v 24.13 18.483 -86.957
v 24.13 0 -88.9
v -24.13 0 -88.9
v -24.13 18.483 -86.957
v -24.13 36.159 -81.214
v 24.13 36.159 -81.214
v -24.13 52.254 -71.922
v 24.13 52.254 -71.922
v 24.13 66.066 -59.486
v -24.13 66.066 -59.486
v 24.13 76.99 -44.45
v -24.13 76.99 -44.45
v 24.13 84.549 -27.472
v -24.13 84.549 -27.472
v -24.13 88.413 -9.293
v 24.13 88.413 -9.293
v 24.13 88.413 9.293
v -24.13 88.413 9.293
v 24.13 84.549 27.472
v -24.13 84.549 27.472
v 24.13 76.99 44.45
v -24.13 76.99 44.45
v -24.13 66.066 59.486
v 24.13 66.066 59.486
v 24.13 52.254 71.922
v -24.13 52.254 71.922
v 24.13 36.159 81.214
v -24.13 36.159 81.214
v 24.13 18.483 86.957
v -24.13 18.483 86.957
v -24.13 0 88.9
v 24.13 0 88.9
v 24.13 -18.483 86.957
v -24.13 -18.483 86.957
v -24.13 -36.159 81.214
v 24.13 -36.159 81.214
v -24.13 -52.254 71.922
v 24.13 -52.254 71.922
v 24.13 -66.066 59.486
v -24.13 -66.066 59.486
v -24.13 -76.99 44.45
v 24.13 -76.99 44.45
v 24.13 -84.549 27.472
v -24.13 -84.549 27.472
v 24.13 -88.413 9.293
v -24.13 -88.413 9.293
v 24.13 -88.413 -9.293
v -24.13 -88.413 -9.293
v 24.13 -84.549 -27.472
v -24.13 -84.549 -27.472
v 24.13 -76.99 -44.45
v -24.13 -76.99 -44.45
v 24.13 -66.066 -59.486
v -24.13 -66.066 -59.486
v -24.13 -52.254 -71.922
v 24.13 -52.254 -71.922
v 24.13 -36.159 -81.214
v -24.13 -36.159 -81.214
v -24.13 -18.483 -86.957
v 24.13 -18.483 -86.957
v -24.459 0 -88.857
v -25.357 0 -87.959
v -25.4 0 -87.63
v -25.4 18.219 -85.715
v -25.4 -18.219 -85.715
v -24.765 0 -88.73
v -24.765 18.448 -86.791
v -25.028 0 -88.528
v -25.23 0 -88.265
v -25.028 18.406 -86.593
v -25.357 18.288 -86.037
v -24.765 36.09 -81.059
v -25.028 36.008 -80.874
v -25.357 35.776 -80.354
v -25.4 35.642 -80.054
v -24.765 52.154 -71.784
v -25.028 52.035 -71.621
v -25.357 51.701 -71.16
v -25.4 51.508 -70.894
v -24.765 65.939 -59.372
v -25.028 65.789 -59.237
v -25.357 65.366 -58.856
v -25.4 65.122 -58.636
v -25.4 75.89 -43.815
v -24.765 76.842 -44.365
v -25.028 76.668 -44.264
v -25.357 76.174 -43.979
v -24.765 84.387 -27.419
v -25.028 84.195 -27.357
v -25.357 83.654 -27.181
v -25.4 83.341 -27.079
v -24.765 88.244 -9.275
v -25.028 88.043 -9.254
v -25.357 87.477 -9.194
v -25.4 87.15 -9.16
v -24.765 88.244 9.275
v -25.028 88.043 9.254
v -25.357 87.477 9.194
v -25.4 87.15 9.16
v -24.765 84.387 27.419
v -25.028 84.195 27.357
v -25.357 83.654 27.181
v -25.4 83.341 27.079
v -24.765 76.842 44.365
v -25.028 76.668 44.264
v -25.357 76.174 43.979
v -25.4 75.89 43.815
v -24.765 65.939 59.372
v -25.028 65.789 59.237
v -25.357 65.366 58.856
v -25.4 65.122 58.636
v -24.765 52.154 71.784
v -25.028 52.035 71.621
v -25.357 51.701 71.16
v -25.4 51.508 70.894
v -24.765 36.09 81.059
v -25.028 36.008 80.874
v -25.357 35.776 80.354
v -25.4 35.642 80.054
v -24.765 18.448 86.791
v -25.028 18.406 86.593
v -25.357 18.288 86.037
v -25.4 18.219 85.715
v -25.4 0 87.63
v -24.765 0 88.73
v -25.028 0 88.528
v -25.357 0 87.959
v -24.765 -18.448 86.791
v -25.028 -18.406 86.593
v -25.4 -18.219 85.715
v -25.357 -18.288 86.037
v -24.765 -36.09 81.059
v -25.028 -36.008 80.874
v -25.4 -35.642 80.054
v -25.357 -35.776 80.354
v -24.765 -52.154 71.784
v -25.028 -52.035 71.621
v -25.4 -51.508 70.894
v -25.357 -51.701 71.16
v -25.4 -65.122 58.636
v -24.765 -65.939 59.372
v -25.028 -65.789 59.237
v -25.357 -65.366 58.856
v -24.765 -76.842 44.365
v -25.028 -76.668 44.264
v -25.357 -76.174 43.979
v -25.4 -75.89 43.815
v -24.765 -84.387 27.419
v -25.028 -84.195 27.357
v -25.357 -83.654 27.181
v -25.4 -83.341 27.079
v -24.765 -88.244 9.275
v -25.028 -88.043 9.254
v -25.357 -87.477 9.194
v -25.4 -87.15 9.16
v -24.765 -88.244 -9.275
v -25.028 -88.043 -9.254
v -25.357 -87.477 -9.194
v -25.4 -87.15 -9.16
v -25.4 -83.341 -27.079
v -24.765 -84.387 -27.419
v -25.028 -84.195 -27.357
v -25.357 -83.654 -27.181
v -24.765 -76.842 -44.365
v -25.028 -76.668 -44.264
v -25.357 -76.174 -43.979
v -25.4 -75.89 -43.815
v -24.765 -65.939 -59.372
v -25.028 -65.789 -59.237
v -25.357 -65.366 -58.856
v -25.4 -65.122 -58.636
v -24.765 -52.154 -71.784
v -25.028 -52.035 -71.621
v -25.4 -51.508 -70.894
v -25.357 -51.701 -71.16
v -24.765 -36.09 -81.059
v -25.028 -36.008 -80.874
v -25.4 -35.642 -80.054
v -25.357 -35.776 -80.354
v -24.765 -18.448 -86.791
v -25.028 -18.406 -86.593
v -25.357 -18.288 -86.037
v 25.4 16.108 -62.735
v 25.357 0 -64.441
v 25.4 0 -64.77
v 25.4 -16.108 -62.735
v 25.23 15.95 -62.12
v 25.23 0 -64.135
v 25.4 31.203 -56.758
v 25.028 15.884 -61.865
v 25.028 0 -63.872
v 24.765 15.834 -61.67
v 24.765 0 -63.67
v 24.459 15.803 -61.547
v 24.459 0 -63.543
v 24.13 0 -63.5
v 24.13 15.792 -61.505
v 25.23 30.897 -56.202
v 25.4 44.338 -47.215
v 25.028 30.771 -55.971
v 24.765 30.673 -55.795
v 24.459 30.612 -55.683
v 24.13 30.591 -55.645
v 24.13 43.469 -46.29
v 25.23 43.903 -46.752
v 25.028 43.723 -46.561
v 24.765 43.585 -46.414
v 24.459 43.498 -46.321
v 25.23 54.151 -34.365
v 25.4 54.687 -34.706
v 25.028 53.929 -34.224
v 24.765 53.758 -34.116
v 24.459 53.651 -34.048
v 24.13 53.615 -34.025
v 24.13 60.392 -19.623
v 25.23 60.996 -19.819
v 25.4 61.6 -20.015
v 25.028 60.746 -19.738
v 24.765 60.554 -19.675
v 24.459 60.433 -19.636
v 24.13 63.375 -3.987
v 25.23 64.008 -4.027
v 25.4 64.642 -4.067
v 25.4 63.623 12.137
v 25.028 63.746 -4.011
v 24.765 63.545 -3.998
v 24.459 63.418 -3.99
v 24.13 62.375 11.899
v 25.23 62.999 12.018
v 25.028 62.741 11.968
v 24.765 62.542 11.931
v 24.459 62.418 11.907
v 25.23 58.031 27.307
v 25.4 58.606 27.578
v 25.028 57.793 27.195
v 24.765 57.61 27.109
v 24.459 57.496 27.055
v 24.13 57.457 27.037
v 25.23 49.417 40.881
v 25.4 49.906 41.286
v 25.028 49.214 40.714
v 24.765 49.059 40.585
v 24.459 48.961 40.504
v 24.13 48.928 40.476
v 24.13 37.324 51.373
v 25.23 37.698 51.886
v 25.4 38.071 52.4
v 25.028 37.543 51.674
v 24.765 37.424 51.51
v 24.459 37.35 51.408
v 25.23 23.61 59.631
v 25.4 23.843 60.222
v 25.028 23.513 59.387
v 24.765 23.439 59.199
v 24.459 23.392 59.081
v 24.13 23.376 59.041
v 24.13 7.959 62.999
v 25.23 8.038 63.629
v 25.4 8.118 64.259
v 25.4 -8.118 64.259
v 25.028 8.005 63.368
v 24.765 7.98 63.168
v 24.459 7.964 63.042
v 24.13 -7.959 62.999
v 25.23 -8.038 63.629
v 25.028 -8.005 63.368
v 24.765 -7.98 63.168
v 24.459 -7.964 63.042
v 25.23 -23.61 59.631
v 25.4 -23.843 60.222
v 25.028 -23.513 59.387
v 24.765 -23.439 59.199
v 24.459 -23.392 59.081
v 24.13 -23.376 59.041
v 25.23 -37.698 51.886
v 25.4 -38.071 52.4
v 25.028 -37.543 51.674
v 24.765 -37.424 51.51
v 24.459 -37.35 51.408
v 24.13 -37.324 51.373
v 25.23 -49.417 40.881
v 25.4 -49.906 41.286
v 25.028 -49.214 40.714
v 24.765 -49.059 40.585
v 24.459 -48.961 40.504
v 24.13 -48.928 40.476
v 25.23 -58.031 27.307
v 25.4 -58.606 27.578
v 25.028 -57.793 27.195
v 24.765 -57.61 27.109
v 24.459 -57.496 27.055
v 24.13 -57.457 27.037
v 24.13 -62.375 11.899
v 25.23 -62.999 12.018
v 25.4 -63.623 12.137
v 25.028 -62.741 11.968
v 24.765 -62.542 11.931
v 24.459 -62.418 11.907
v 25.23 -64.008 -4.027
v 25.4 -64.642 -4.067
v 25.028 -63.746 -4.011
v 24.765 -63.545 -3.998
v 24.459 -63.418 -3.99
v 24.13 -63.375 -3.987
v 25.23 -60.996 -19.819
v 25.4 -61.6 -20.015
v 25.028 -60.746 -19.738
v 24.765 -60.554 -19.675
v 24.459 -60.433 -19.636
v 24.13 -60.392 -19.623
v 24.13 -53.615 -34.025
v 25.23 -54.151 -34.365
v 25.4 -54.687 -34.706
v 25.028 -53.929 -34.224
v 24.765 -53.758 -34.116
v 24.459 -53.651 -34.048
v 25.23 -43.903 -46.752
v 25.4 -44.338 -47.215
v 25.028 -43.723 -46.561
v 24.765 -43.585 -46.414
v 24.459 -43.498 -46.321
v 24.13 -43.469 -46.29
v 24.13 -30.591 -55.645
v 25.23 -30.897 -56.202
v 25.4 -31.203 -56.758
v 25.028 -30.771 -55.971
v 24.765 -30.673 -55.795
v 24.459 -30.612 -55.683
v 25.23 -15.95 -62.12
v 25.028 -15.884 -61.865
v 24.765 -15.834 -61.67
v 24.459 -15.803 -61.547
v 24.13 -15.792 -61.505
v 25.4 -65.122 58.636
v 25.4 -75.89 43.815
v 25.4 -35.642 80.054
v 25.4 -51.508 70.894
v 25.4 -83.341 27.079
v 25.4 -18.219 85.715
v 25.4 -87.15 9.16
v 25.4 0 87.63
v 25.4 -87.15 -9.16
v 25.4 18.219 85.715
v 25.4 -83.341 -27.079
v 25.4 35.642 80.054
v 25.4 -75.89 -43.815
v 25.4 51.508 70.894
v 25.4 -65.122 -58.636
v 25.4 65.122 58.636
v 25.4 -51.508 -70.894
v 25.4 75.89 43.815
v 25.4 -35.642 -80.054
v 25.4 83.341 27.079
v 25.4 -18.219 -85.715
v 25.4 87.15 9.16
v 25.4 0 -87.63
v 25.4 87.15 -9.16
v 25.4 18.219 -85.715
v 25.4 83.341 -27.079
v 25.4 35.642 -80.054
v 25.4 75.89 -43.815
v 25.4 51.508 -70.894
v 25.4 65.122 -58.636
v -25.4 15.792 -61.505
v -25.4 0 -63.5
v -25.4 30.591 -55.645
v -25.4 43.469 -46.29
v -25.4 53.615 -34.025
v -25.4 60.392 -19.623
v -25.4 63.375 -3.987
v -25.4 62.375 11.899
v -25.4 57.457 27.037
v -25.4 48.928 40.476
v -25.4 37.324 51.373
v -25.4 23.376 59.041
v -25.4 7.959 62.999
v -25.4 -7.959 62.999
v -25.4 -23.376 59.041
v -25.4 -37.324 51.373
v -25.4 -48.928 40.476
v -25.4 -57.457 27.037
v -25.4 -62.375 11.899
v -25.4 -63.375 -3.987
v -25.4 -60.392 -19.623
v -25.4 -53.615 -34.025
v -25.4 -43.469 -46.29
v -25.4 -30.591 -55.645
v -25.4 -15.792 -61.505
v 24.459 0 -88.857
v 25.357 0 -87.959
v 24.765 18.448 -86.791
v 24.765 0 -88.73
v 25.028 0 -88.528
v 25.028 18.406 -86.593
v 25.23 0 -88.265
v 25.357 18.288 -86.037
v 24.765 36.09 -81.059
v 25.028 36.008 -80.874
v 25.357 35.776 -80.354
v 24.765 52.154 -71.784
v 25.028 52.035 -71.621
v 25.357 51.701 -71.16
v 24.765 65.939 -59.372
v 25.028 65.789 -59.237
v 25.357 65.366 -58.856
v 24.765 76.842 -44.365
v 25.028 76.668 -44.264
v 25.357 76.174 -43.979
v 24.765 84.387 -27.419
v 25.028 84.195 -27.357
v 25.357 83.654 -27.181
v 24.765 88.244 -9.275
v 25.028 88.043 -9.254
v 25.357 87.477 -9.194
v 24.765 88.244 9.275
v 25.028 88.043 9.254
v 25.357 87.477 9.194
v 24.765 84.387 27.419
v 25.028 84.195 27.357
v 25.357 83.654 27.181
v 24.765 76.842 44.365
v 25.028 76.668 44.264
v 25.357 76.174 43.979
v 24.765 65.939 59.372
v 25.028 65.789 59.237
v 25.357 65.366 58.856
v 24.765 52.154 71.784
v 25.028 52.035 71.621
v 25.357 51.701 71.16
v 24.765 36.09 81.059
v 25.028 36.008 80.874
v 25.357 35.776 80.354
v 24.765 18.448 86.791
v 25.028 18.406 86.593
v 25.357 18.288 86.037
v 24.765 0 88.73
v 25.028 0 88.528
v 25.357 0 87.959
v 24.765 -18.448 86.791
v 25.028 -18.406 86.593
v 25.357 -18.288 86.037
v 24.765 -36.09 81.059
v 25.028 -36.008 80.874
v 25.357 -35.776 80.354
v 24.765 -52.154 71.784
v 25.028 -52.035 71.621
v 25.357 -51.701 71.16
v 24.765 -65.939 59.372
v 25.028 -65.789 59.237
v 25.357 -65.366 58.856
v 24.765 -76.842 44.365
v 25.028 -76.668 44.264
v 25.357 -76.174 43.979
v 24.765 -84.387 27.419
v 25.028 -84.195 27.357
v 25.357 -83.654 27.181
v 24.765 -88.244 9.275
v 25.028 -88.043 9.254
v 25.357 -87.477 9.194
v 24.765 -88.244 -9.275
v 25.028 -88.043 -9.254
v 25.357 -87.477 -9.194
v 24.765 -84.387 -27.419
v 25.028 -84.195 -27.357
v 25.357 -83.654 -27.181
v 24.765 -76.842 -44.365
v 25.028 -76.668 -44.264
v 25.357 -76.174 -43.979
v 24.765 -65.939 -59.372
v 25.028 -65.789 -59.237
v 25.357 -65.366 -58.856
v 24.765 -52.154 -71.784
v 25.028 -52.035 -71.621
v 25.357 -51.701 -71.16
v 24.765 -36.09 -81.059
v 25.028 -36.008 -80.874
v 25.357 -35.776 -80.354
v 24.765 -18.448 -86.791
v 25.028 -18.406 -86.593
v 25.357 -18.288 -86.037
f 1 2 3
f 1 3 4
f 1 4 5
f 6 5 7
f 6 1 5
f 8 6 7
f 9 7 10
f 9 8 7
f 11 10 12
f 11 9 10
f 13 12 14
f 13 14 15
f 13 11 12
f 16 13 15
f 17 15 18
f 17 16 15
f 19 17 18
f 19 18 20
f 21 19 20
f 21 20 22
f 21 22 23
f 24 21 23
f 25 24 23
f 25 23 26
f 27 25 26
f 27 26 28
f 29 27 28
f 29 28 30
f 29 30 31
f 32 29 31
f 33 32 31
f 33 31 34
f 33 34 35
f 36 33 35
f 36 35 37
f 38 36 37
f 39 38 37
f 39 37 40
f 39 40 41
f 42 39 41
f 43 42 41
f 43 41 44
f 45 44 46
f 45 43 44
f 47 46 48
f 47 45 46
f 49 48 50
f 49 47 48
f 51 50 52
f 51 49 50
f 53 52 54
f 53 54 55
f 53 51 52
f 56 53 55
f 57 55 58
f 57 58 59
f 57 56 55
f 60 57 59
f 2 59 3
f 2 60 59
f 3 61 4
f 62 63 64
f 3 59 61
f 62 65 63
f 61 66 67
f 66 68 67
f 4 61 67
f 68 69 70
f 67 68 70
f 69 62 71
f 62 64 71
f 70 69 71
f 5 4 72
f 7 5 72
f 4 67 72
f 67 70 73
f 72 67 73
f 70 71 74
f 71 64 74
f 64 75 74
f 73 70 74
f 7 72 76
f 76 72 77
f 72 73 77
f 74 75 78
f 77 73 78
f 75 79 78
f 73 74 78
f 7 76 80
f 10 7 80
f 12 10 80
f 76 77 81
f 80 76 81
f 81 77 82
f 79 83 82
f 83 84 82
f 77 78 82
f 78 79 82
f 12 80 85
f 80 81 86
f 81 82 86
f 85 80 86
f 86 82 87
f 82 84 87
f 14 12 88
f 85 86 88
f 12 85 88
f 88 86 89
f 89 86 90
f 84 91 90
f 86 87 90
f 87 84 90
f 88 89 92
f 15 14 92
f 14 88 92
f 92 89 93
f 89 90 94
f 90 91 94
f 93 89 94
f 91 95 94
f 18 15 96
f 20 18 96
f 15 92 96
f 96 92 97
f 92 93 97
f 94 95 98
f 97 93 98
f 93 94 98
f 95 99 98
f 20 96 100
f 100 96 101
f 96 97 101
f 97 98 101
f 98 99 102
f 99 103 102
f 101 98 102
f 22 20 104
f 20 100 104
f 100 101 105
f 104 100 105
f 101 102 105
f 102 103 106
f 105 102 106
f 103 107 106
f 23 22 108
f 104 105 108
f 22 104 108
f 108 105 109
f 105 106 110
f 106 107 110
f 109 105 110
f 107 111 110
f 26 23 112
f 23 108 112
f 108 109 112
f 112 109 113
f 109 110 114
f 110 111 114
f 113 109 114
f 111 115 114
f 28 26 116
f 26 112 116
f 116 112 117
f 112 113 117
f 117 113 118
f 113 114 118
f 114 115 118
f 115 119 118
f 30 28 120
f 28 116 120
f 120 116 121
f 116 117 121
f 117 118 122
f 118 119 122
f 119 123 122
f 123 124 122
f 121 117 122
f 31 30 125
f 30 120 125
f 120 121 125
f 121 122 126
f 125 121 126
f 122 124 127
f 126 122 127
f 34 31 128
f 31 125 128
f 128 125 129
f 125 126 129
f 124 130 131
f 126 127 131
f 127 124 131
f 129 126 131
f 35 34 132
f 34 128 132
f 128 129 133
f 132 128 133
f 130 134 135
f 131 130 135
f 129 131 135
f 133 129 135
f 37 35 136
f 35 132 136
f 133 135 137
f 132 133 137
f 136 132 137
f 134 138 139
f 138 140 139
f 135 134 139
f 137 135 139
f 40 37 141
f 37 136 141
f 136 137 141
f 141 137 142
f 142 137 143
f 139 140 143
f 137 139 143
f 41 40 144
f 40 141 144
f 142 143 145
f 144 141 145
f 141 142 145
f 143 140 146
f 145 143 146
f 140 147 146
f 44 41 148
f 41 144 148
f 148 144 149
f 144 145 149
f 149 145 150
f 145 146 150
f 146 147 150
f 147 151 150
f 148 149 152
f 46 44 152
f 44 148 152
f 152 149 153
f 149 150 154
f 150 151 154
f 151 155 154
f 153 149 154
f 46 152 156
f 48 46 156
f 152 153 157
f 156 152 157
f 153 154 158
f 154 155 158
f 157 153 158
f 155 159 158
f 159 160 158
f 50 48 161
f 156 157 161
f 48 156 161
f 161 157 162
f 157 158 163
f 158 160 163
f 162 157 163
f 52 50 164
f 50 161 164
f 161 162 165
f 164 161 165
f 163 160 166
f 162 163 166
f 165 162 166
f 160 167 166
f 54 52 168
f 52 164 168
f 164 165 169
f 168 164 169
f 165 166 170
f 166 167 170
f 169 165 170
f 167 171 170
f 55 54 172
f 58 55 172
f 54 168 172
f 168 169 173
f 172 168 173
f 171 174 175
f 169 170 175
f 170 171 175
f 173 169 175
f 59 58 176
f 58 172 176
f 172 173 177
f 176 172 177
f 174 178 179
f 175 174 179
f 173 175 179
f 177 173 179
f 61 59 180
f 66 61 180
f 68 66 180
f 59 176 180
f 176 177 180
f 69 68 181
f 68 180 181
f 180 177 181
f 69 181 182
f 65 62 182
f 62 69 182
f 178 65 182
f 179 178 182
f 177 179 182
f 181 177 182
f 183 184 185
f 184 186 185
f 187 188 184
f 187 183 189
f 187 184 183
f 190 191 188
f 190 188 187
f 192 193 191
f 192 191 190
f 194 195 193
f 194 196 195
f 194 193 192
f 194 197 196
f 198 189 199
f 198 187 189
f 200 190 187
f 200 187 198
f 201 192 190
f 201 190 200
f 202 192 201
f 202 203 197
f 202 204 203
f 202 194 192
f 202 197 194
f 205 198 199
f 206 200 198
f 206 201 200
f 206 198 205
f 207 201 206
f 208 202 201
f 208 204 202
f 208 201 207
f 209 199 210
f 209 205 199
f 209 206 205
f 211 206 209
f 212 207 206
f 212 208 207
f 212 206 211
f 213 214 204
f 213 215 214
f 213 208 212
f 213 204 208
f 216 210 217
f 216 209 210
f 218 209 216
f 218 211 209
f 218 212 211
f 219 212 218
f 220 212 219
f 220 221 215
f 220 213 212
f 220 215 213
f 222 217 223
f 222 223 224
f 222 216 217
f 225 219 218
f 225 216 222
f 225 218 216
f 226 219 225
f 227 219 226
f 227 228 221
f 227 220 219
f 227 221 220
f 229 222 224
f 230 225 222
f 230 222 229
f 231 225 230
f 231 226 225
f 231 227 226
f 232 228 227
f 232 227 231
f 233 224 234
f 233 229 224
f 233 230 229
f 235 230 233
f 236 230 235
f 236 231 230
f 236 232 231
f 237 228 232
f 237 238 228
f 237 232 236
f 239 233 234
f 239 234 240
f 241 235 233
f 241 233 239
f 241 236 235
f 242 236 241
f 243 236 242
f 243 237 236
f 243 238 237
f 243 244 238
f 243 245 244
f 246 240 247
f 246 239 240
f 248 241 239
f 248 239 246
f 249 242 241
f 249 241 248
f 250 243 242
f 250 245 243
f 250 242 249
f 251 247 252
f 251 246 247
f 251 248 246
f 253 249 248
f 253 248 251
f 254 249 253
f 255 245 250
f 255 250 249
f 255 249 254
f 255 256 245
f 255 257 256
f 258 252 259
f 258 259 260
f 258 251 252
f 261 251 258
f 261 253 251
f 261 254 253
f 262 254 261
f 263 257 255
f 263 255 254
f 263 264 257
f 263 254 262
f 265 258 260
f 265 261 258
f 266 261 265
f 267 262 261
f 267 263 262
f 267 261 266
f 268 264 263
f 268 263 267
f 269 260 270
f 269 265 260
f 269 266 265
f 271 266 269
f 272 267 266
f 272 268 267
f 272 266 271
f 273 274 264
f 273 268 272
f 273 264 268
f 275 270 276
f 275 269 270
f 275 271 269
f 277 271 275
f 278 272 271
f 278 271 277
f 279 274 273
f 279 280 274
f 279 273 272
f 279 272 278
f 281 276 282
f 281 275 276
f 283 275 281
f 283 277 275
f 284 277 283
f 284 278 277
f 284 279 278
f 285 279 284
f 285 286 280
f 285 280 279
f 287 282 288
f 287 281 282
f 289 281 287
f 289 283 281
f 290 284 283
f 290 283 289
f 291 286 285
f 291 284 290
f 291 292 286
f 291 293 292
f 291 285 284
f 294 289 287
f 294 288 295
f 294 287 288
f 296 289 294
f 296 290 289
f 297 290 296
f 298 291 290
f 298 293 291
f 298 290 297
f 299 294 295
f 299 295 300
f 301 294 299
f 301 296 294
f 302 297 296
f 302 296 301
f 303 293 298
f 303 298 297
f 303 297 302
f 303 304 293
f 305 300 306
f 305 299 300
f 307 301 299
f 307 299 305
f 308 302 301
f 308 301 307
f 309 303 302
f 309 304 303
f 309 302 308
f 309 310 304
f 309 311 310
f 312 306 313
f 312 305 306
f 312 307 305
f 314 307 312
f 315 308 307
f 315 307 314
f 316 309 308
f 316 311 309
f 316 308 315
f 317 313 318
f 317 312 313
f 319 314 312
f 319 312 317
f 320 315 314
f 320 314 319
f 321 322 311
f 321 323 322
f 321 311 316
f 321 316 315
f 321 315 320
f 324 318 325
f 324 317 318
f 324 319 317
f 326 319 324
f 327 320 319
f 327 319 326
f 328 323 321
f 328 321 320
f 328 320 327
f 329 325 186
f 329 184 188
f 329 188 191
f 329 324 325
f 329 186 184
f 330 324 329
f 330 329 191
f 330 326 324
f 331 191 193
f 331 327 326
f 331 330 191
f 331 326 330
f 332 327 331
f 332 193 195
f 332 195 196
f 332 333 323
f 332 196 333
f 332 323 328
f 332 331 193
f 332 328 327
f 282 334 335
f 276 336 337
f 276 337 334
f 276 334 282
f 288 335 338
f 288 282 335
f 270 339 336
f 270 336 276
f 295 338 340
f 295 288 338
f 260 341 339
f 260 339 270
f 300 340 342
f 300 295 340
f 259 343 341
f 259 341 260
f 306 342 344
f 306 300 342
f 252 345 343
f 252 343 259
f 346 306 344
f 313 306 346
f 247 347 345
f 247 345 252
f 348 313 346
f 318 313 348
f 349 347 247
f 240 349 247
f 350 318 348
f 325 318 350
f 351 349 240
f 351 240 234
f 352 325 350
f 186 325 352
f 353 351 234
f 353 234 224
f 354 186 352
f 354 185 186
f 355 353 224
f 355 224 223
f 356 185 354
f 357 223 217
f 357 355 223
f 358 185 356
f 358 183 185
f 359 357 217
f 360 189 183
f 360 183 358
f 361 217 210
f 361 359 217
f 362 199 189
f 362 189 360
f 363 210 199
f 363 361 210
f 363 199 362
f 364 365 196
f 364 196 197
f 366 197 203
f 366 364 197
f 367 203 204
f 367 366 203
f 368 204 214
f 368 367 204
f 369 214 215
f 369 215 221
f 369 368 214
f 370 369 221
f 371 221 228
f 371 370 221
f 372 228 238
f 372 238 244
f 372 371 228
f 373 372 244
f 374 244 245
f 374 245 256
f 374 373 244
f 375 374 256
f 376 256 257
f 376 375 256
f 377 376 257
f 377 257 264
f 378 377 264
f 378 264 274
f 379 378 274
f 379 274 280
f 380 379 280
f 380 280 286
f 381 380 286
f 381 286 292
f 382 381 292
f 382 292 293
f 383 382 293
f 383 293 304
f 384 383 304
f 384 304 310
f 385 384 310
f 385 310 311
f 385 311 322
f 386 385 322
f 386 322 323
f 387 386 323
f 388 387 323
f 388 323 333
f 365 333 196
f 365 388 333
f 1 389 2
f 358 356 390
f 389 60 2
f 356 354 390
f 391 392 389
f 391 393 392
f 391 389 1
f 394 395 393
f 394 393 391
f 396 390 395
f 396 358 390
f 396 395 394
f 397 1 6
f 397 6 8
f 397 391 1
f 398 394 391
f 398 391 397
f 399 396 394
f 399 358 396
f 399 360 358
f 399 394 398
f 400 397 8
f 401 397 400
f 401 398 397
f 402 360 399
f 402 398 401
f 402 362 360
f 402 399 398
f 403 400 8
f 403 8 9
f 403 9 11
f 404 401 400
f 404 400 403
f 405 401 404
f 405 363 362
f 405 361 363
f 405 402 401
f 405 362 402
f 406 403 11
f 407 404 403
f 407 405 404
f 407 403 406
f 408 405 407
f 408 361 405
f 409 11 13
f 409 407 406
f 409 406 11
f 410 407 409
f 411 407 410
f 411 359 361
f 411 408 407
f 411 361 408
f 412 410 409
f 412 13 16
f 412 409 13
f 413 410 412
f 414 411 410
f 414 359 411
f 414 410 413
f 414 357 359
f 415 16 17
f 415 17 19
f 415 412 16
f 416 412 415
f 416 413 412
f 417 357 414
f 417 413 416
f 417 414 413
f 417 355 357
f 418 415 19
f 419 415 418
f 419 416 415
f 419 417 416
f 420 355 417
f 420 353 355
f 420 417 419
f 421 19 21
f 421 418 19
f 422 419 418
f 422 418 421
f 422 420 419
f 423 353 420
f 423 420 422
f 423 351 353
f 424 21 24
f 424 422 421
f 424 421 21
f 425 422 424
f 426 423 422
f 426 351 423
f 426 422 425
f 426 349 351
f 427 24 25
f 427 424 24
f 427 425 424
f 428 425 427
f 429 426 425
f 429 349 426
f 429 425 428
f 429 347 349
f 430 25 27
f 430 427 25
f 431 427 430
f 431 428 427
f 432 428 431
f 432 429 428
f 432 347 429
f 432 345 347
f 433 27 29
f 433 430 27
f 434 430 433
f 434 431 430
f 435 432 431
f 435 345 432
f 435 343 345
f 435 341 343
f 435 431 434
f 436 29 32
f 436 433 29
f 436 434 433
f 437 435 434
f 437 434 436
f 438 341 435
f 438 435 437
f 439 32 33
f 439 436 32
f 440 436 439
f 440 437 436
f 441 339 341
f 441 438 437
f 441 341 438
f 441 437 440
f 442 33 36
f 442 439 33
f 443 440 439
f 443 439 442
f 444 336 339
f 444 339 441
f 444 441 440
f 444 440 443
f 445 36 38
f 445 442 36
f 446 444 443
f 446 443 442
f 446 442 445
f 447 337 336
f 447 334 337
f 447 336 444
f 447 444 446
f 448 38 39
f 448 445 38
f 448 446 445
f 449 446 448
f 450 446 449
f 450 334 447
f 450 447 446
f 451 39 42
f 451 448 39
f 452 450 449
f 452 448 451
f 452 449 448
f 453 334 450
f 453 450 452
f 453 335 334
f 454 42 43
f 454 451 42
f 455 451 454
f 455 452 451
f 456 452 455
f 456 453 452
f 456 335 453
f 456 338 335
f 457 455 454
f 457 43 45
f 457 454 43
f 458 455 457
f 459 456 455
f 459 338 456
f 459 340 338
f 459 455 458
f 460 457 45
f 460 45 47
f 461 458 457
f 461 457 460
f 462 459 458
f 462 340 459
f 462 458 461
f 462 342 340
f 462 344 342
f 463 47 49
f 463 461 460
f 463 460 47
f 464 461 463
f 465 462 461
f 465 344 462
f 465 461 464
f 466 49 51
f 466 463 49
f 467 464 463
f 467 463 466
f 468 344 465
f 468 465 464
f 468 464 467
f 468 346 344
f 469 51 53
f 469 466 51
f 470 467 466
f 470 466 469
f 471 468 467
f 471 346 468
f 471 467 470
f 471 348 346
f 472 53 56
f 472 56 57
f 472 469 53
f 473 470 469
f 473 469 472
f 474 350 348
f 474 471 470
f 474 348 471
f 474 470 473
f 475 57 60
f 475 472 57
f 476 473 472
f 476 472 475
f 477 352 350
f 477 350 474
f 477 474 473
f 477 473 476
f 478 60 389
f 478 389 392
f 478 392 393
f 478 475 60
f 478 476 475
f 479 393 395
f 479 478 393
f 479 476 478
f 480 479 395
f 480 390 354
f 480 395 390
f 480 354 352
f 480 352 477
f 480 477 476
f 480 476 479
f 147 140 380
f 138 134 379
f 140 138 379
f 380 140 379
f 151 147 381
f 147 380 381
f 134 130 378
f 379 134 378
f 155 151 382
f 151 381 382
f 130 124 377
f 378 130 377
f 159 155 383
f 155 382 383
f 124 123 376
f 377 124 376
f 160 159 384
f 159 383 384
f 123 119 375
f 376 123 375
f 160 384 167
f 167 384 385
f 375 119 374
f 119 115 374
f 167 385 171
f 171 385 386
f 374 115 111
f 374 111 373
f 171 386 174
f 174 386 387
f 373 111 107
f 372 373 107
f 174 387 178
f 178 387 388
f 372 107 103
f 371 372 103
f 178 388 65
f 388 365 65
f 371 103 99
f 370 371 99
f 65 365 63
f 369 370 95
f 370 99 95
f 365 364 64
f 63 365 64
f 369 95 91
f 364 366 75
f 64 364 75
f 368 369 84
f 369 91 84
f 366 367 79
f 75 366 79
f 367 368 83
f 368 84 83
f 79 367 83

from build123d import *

# Parameters (mm, degrees)
SKETCH1_R           = 88.9
SKETCH1_R_2         = 63.5
BOSS_EXTRUDE1_DEPTH = 25.4
FILLET1_R           = 1.27


with BuildPart() as part:
    # Sketch1 → Boss-Extrude1 (new, symmetric)
    with BuildSketch(Plane(origin=(0, 0, 0), x_dir=(0, 0, -1), z_dir=(1, 0, 0))):
        Circle(SKETCH1_R)
        Circle(SKETCH1_R_2, mode=Mode.SUBTRACT)
    extrude(amount=BOSS_EXTRUDE1_DEPTH, both=True)

    # Fillet1
    fillet1_edges = [part.edges().sort_by_distance(p)[0] for p in [
        (-25.4, 0, 88.9),
        (25.4, 0, 88.9),
        (25.4, 0, 63.5),
    ]]
    fillet(fillet1_edges, radius=FILLET1_R)


solid = part.part
